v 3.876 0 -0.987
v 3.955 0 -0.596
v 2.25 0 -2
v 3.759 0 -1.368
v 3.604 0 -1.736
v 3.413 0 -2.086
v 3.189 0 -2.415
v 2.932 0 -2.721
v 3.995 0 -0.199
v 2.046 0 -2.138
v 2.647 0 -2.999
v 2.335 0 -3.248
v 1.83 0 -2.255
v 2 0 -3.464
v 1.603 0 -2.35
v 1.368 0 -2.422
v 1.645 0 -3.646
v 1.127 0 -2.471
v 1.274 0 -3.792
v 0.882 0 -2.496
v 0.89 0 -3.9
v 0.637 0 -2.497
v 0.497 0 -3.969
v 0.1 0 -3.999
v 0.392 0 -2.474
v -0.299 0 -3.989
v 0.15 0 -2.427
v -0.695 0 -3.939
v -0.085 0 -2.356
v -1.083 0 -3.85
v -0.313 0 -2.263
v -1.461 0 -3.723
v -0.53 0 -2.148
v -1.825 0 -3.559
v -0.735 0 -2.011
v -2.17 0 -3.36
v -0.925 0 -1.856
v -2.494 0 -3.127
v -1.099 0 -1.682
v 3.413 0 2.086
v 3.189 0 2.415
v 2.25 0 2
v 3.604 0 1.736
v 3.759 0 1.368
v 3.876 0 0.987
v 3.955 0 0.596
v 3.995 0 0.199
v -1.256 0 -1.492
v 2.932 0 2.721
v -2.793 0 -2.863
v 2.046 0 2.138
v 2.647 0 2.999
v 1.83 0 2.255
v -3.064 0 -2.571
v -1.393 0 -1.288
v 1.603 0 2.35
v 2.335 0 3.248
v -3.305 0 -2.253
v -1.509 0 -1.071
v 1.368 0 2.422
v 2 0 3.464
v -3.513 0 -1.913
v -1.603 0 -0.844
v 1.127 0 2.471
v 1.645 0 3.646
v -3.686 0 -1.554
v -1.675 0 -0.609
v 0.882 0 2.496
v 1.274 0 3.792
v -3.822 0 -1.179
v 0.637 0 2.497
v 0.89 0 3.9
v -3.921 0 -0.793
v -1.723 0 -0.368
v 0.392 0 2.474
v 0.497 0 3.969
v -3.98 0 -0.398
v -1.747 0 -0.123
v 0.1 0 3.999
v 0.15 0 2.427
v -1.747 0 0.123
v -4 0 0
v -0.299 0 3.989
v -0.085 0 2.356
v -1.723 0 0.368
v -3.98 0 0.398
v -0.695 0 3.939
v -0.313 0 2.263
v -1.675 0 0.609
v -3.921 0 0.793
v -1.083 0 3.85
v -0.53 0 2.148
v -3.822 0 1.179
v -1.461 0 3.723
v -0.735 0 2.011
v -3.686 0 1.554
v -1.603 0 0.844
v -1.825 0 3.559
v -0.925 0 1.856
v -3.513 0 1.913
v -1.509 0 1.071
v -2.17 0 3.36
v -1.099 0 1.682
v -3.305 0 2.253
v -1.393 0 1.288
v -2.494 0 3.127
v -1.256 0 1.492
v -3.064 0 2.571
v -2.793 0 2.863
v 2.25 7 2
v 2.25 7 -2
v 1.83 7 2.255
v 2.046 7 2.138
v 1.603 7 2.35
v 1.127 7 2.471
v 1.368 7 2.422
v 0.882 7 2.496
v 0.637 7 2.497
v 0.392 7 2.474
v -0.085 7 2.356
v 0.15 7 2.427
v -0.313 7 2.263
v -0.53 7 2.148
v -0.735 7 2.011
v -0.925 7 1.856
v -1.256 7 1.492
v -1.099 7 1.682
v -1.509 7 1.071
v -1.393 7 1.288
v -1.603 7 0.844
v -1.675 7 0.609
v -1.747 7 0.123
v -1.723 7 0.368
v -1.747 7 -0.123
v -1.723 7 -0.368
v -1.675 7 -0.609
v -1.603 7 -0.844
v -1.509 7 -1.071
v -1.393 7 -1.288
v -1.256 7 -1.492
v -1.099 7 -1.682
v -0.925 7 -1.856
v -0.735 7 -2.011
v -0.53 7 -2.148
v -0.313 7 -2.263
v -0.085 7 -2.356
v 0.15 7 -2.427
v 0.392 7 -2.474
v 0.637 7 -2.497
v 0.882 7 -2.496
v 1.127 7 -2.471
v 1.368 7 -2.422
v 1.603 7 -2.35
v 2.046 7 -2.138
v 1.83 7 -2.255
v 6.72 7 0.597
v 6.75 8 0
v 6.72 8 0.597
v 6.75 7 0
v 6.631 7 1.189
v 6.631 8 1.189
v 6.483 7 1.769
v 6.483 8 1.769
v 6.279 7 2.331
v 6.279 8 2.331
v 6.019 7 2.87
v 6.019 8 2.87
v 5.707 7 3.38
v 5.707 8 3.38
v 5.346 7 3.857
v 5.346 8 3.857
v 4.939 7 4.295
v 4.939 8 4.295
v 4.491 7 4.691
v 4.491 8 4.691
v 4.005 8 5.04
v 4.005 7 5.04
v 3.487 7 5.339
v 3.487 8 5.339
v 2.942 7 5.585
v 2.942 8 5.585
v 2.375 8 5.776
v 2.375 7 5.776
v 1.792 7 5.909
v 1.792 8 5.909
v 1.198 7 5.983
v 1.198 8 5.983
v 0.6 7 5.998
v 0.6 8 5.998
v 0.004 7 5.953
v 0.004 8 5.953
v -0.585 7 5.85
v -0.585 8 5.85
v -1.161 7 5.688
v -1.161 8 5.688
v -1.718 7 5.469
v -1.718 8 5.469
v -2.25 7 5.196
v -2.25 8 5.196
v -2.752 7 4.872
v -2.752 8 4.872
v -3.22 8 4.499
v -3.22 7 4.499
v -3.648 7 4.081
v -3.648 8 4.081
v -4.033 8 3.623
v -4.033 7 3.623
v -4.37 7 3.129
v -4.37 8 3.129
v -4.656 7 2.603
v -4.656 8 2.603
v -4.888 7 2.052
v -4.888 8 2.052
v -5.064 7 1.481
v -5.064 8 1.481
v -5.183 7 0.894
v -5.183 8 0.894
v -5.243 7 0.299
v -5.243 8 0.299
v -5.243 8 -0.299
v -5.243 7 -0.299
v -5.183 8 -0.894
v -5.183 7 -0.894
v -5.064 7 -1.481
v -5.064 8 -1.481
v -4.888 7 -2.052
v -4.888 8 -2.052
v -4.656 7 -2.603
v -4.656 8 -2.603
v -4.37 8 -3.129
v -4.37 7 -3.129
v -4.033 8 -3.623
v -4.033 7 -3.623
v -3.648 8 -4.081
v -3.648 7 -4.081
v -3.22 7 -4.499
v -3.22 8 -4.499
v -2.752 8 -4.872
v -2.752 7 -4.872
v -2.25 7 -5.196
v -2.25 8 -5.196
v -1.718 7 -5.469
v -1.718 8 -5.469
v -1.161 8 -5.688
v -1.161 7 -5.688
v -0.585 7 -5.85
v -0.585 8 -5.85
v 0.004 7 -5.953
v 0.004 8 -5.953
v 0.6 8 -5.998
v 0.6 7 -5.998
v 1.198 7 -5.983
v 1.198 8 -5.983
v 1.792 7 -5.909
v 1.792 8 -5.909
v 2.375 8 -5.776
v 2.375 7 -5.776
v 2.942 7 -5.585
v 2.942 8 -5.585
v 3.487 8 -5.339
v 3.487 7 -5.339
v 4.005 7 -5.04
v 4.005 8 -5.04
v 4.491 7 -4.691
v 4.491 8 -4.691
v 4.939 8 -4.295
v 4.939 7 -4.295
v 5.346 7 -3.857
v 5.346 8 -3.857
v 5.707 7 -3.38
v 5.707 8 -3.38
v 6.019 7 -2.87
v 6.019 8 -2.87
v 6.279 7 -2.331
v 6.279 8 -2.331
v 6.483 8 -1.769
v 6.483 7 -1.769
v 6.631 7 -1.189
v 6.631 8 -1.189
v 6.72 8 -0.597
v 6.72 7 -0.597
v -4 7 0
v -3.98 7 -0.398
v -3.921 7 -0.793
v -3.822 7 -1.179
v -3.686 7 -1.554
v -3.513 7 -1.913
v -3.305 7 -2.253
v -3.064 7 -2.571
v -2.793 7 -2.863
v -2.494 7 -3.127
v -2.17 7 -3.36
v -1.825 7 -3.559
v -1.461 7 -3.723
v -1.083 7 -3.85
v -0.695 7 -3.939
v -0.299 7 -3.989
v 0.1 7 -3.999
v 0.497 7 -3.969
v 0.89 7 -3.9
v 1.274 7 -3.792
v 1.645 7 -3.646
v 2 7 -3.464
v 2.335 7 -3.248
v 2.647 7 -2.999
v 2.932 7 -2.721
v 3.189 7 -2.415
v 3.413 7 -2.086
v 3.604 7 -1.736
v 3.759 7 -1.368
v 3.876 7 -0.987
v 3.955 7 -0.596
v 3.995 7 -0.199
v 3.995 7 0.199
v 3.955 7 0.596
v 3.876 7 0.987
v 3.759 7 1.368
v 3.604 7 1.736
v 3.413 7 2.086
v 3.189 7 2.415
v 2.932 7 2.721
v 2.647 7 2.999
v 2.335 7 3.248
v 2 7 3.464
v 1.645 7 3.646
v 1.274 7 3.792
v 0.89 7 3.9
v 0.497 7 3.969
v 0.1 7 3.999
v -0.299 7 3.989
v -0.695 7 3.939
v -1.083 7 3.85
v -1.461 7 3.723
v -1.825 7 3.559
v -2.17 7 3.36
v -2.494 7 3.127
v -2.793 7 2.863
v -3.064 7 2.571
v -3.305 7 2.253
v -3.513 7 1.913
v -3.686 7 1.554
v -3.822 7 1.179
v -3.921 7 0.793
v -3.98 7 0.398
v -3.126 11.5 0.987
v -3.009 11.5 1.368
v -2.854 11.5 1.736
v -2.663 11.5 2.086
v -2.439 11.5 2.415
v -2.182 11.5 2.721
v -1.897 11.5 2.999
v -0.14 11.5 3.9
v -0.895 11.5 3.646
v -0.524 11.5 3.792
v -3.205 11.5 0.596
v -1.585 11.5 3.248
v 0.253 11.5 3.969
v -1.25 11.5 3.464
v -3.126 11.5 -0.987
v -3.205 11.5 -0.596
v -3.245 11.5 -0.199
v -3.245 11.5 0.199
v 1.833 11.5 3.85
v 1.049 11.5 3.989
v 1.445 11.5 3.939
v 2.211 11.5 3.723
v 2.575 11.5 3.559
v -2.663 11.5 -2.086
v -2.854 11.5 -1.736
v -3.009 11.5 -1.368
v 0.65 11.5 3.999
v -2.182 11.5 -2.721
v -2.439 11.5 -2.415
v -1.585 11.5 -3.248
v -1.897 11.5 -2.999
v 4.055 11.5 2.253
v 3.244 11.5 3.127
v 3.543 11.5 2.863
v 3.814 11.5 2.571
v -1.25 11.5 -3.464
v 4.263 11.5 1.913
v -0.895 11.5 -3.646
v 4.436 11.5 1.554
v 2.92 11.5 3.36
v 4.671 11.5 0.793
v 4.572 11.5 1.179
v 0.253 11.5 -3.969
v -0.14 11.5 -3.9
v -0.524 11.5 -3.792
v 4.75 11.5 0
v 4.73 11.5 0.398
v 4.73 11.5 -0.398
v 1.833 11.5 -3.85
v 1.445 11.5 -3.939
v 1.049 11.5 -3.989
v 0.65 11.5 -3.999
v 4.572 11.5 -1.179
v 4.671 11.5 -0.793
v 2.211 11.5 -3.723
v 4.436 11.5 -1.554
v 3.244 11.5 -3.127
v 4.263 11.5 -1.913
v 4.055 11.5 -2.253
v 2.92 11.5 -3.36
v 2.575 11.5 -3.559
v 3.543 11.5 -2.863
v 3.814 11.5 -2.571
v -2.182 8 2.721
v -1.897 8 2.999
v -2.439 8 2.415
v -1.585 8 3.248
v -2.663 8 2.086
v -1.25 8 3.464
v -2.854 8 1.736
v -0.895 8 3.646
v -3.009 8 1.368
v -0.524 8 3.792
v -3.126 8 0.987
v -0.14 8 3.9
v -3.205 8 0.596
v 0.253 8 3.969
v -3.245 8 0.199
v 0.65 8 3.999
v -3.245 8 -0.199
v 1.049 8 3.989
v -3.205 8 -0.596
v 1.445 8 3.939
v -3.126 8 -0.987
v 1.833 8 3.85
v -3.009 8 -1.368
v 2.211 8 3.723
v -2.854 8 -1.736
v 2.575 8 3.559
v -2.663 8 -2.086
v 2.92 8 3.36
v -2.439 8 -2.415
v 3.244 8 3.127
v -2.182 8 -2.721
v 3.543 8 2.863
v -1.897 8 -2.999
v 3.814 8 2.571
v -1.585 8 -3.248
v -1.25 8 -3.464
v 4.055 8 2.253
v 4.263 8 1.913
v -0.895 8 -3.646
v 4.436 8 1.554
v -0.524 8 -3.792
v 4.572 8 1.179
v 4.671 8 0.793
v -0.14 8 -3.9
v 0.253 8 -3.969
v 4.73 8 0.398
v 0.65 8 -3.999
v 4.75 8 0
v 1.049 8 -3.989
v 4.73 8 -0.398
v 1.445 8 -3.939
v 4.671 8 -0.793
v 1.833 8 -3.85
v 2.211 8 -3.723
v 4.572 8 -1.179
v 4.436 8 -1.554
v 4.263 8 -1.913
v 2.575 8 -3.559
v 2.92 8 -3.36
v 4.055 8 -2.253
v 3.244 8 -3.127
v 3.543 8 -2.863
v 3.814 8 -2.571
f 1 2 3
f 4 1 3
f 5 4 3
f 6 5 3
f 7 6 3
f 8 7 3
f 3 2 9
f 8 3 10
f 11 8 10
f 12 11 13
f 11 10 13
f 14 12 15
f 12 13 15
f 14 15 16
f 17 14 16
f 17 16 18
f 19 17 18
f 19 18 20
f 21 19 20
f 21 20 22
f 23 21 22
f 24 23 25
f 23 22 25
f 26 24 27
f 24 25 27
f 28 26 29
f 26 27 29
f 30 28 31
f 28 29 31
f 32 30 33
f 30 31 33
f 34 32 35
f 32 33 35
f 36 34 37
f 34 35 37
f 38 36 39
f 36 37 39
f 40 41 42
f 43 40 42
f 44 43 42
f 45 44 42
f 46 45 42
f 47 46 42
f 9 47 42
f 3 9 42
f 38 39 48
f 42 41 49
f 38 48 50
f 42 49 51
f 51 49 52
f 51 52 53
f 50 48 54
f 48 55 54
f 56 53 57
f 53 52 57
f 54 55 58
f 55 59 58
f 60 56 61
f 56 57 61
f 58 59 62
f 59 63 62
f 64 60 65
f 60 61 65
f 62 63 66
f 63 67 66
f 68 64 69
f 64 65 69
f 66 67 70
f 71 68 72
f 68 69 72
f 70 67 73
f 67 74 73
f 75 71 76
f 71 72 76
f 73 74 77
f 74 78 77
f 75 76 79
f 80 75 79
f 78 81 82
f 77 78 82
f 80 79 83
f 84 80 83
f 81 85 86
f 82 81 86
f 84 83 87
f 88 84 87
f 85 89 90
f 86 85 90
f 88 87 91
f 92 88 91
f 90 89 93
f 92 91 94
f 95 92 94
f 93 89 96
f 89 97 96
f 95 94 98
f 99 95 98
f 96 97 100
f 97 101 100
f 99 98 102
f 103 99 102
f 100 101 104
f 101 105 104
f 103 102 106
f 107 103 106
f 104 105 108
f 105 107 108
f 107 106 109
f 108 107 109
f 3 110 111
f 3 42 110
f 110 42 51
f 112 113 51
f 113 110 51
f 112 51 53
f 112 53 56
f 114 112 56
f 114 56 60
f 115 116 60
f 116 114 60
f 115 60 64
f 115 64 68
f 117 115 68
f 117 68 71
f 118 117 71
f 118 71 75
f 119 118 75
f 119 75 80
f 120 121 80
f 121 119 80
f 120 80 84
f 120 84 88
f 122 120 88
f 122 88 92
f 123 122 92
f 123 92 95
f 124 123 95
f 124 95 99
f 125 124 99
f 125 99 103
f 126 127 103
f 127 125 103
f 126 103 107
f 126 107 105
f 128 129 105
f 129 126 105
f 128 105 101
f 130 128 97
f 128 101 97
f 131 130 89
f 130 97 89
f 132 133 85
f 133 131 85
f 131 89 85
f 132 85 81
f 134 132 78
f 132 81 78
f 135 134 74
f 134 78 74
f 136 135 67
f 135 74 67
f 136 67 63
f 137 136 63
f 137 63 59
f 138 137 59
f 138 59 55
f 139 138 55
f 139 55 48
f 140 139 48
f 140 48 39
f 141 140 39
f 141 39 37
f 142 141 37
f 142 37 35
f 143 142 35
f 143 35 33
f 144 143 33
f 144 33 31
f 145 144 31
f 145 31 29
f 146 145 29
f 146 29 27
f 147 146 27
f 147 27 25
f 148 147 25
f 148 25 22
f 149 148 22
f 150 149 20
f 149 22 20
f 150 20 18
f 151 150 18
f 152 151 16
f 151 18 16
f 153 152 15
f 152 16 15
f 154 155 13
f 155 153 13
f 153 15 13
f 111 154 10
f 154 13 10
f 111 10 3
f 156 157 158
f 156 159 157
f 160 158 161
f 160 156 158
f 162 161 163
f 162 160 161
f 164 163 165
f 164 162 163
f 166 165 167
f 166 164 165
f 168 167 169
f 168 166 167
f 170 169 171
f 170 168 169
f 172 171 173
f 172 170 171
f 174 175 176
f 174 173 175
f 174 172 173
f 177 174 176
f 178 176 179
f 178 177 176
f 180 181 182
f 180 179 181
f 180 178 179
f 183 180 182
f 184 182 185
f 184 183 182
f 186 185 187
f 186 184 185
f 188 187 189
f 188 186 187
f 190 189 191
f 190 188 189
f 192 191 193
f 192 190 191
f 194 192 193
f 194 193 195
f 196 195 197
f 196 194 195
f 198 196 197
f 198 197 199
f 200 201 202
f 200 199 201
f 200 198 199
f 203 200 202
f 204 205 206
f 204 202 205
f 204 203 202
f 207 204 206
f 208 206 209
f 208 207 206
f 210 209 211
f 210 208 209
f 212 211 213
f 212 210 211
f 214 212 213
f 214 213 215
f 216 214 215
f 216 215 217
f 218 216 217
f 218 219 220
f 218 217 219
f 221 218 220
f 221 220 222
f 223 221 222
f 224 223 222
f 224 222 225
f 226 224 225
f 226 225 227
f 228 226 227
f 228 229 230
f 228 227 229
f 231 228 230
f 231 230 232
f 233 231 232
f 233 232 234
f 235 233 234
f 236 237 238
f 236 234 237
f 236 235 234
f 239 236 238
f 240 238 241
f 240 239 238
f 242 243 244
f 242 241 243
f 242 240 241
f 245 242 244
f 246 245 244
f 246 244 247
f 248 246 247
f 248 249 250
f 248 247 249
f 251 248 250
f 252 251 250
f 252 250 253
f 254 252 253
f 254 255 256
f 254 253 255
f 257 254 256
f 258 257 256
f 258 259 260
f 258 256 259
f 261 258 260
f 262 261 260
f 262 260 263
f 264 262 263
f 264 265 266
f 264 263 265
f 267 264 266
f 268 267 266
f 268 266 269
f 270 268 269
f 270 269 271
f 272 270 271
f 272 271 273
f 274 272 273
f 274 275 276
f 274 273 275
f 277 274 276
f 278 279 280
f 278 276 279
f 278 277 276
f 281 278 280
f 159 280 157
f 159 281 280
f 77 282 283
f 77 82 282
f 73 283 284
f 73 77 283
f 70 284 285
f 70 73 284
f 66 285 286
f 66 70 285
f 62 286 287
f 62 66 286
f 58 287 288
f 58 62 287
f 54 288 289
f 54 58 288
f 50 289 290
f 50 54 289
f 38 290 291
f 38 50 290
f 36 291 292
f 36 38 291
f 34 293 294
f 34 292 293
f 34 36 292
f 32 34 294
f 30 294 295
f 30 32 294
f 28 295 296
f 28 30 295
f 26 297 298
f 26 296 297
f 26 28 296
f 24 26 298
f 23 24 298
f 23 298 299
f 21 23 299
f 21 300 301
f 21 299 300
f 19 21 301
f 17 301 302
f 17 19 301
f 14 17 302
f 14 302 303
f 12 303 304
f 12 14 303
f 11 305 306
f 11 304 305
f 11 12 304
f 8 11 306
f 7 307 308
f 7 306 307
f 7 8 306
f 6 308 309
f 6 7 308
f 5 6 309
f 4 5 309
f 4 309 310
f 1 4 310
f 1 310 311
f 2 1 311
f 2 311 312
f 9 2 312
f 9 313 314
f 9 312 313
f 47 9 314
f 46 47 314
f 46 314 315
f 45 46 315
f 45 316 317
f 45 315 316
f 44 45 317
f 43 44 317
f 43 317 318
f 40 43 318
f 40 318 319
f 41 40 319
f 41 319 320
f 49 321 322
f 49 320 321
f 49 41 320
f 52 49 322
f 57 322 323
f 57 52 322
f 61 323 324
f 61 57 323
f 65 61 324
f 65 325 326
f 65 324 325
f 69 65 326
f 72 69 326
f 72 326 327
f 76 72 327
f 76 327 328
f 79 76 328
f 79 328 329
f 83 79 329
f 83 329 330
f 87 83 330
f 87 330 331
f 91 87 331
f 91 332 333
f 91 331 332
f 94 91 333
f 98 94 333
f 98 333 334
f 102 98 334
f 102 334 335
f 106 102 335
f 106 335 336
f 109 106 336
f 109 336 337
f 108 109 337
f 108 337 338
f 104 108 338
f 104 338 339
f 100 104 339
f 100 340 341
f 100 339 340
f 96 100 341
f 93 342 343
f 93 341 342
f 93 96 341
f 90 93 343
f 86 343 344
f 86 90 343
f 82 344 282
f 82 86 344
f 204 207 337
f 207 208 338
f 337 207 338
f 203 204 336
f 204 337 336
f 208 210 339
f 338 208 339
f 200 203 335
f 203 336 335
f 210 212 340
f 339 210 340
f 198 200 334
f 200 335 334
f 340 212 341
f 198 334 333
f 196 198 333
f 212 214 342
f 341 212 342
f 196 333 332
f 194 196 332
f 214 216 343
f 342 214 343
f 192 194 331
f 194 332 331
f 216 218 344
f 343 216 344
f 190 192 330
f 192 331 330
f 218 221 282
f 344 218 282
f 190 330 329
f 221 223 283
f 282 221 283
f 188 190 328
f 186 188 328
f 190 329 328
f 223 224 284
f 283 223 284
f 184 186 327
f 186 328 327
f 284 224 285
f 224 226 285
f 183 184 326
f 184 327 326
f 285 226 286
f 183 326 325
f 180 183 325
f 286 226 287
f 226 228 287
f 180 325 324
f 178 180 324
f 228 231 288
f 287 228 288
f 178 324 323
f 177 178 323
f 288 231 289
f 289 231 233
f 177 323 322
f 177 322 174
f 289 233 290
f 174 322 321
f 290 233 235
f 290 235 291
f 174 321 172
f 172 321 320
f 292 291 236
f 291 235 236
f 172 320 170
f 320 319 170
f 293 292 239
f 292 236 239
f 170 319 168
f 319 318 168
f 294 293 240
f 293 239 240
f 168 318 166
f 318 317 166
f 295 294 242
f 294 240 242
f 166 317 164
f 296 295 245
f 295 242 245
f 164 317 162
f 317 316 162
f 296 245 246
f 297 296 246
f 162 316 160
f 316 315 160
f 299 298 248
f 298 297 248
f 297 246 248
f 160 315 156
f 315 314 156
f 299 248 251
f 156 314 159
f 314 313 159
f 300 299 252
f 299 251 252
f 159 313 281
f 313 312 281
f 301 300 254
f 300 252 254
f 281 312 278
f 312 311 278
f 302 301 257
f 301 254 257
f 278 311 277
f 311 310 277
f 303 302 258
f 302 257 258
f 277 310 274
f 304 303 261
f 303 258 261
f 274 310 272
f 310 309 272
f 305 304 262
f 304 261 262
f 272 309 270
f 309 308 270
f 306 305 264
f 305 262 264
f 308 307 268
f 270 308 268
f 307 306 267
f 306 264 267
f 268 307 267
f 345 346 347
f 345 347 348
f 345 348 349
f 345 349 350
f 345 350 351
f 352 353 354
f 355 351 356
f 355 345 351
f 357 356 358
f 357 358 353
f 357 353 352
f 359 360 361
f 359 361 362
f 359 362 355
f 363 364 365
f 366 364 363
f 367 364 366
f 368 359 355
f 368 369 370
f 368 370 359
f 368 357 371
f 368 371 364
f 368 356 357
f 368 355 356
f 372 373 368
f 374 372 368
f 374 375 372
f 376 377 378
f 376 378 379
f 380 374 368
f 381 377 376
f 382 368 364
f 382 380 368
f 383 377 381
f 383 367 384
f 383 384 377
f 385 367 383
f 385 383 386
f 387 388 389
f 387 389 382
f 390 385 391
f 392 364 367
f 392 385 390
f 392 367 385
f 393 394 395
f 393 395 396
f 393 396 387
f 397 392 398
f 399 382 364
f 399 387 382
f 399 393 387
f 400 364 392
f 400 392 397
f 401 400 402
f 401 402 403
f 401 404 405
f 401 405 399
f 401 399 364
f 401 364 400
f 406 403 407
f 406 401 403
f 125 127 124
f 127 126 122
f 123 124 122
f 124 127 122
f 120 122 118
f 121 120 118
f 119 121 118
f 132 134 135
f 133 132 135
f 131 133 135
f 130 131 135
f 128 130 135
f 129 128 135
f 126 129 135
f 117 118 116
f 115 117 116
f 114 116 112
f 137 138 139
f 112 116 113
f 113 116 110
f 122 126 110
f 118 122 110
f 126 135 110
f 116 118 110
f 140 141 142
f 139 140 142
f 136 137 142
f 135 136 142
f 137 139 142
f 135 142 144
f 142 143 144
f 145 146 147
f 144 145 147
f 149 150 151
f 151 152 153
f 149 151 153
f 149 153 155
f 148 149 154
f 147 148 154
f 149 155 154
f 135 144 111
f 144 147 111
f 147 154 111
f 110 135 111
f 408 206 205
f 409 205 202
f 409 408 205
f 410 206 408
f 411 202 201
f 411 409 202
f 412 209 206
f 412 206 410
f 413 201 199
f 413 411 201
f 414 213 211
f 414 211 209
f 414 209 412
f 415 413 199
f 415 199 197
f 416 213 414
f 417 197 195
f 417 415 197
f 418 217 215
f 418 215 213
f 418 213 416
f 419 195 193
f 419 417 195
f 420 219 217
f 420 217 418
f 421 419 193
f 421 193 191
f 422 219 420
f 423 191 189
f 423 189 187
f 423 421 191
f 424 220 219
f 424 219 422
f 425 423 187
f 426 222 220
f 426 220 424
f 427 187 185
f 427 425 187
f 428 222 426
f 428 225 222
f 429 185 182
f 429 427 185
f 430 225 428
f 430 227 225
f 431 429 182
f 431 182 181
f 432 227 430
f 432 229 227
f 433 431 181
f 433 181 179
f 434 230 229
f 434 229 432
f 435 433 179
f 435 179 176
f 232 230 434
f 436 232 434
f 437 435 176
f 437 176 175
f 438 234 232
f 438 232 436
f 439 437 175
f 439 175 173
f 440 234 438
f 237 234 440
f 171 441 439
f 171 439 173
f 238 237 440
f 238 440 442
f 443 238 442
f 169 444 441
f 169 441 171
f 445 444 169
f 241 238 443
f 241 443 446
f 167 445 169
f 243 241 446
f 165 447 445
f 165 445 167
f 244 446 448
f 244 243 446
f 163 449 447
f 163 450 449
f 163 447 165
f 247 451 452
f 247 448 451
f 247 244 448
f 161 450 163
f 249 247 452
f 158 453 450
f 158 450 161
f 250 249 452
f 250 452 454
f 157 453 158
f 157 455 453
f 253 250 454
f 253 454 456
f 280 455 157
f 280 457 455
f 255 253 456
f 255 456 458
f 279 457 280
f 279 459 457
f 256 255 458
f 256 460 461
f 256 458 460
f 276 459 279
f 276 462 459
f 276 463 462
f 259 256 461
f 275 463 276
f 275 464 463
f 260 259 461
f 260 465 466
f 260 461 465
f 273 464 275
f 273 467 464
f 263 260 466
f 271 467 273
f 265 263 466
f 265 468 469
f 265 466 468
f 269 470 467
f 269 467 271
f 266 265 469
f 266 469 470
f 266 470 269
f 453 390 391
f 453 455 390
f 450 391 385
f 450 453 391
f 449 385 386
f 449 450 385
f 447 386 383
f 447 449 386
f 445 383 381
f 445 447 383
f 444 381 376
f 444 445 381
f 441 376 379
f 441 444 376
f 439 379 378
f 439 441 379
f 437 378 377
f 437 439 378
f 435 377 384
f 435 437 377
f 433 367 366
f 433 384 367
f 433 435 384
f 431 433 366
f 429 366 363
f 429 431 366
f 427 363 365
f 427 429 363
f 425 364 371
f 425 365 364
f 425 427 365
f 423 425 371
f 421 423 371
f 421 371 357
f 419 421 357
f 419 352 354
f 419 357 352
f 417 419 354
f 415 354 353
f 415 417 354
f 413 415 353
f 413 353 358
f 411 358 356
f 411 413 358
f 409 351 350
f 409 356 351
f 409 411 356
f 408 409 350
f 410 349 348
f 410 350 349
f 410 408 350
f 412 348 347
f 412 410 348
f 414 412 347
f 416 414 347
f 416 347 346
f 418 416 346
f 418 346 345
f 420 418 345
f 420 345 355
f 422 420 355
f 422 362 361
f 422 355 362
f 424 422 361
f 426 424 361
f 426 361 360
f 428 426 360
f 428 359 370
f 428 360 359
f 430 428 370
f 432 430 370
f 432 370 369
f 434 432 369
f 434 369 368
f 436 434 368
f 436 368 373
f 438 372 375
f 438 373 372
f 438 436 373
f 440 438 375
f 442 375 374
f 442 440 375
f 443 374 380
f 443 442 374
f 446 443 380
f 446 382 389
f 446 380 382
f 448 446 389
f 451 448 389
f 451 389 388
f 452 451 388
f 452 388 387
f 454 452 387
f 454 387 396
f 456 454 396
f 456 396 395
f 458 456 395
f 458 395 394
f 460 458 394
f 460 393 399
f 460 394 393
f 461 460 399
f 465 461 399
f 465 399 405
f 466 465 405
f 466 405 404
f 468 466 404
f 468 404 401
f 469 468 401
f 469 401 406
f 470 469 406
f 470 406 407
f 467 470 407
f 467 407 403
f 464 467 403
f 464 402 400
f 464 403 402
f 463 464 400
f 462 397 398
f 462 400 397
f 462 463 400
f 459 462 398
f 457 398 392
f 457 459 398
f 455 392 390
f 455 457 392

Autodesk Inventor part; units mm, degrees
ref_plane "YZ Plane" through (0, 0, 0) normal (1, 0, 0) x (0, 1, 0)
ref_plane "XZ Plane" through (0, 0, 0) normal (0, 1, 0) x (-1, 0, 0)
ref_plane "XY Plane" through (0, 0, 0) normal (0, 0, 1) x (1, 0, 0)
sketch "Szkic1" plane through (0, 0, 0) normal (0, 1, 0) x (-1, 0, 0)
  circle A0 centre (0, 0) radius 4
  arc A1 (-2.25, -2) -> (-2.25, 2) centre (-0.75, 0) ccw
  line L0 (-2.25, 2) -> (-2.25, -2)
  dimension "d2" = 4
  dimension "d15" = 2.5
  dimension "d16" = 0.75
  dimension "d23" = 1.5
extrude "Wyciągnięcie proste1" add sketch "Szkic1" along normal blind 7
sketch "Szkic2" plane through (0, 7, 0) normal (0, 1, 0) x (1, 0, 0)
  circle A0 centre (0.75, 0) radius 6
  arc A1 (2.25, 2) -> (2.25, -2) centre (0.75, 0) ccw projected
  arc A2 (2.25, 2) -> (2.25, -2) centre (0.75, 0) ccw projected
  dimension "d32" = 6
extrude "Wyciągnięcie proste2" add sketch "Szkic2" along normal blind 1
sketch "Szkic3" plane through (0.75, 8, 0) normal (0, 1, 0) x (1, 0, 0)
  circle A0 centre (0, 0) radius 4
  circle A1 centre (0, 0) radius 6 projected
  arc A2 (1.5, 2) -> (1.5, -2) centre (0, 0) ccw projected
  dimension "d33" = 4
extrude "Wyciągnięcie proste3" add sketch "Szkic3" along normal blind 3.5 contours A0
equation "\"d2\" = Lrw"
equation "\"d15\" = silnik_rw"
equation "\"d16\" = E1"
equation "\"d28\" = Lh"
equation "\"d33\" = Lrw"
equation "\"d34\" = 0.5 * Lh"
equation "\"Lrz\" = 11"
equation "\"Lrw\" = 4"
equation "\"Lh\" = 7"
equation "\"N1\" = 31"
equation "\"Rr\" = 1.5"
equation "\"R1\" = 5"
equation "\"h1\" = 2"
equation "\"h2\" = 5"
equation "\"E1\" = 0.5 * Rr"
equation "\"dwr1\" = -0.25 * Rr + 0.25 * R - 0.25 * Lrz"
equation "\"dwr2\" = 0.5 * Lrz + 0.5 * R"
equation "\"dwr\" = R"
equation "\"silnik_rw\" = 2.5"
equation "\"silnik_r_wypust\" = Lrz"
equation "\"silnik_d_srub\" = 31"
equation "\"R\" = 29.602819"
properties part number "Dysk_we"
